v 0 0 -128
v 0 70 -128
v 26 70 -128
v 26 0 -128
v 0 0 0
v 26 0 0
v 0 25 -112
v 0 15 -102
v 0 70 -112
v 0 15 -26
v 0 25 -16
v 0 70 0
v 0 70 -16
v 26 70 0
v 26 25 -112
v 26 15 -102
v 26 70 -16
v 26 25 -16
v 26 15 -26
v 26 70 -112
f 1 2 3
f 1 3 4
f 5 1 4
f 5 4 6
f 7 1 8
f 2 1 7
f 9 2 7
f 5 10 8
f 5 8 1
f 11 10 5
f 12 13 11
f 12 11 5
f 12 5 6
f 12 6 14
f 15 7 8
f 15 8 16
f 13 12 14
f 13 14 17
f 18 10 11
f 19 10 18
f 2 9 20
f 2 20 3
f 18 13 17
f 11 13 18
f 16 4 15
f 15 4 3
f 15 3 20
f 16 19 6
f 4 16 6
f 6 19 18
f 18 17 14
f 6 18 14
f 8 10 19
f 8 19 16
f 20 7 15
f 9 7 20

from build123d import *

# Parameters (mm, degrees)
BOSS_EXTRUDE1_DEPTH = 26
CHAMFER1_SIZE       = 10


with BuildPart() as part:
    # Sketch1 → Boss-Extrude1 (new body)
    with BuildSketch(Plane(origin=(0, 0, 0), x_dir=(0, 0, -1), z_dir=(1, 0, 0))):
        Polygon((0, 0), (0, 70.000000066), (16, 70.000000066), (16, 15.000000066), (112, 15.000000066), (112, 70.000000066), (128, 70.000000066), (128, 0), align=None)
    extrude(amount=BOSS_EXTRUDE1_DEPTH)

    # Chamfer1
    chamfer1_edges = [part.edges().sort_by_distance(p)[0] for p in [
        (13, 15.000000066, -16),
        (13, 15.000000066, -112),
    ]]
    chamfer(chamfer1_edges, length=CHAMFER1_SIZE)


solid = part.part
